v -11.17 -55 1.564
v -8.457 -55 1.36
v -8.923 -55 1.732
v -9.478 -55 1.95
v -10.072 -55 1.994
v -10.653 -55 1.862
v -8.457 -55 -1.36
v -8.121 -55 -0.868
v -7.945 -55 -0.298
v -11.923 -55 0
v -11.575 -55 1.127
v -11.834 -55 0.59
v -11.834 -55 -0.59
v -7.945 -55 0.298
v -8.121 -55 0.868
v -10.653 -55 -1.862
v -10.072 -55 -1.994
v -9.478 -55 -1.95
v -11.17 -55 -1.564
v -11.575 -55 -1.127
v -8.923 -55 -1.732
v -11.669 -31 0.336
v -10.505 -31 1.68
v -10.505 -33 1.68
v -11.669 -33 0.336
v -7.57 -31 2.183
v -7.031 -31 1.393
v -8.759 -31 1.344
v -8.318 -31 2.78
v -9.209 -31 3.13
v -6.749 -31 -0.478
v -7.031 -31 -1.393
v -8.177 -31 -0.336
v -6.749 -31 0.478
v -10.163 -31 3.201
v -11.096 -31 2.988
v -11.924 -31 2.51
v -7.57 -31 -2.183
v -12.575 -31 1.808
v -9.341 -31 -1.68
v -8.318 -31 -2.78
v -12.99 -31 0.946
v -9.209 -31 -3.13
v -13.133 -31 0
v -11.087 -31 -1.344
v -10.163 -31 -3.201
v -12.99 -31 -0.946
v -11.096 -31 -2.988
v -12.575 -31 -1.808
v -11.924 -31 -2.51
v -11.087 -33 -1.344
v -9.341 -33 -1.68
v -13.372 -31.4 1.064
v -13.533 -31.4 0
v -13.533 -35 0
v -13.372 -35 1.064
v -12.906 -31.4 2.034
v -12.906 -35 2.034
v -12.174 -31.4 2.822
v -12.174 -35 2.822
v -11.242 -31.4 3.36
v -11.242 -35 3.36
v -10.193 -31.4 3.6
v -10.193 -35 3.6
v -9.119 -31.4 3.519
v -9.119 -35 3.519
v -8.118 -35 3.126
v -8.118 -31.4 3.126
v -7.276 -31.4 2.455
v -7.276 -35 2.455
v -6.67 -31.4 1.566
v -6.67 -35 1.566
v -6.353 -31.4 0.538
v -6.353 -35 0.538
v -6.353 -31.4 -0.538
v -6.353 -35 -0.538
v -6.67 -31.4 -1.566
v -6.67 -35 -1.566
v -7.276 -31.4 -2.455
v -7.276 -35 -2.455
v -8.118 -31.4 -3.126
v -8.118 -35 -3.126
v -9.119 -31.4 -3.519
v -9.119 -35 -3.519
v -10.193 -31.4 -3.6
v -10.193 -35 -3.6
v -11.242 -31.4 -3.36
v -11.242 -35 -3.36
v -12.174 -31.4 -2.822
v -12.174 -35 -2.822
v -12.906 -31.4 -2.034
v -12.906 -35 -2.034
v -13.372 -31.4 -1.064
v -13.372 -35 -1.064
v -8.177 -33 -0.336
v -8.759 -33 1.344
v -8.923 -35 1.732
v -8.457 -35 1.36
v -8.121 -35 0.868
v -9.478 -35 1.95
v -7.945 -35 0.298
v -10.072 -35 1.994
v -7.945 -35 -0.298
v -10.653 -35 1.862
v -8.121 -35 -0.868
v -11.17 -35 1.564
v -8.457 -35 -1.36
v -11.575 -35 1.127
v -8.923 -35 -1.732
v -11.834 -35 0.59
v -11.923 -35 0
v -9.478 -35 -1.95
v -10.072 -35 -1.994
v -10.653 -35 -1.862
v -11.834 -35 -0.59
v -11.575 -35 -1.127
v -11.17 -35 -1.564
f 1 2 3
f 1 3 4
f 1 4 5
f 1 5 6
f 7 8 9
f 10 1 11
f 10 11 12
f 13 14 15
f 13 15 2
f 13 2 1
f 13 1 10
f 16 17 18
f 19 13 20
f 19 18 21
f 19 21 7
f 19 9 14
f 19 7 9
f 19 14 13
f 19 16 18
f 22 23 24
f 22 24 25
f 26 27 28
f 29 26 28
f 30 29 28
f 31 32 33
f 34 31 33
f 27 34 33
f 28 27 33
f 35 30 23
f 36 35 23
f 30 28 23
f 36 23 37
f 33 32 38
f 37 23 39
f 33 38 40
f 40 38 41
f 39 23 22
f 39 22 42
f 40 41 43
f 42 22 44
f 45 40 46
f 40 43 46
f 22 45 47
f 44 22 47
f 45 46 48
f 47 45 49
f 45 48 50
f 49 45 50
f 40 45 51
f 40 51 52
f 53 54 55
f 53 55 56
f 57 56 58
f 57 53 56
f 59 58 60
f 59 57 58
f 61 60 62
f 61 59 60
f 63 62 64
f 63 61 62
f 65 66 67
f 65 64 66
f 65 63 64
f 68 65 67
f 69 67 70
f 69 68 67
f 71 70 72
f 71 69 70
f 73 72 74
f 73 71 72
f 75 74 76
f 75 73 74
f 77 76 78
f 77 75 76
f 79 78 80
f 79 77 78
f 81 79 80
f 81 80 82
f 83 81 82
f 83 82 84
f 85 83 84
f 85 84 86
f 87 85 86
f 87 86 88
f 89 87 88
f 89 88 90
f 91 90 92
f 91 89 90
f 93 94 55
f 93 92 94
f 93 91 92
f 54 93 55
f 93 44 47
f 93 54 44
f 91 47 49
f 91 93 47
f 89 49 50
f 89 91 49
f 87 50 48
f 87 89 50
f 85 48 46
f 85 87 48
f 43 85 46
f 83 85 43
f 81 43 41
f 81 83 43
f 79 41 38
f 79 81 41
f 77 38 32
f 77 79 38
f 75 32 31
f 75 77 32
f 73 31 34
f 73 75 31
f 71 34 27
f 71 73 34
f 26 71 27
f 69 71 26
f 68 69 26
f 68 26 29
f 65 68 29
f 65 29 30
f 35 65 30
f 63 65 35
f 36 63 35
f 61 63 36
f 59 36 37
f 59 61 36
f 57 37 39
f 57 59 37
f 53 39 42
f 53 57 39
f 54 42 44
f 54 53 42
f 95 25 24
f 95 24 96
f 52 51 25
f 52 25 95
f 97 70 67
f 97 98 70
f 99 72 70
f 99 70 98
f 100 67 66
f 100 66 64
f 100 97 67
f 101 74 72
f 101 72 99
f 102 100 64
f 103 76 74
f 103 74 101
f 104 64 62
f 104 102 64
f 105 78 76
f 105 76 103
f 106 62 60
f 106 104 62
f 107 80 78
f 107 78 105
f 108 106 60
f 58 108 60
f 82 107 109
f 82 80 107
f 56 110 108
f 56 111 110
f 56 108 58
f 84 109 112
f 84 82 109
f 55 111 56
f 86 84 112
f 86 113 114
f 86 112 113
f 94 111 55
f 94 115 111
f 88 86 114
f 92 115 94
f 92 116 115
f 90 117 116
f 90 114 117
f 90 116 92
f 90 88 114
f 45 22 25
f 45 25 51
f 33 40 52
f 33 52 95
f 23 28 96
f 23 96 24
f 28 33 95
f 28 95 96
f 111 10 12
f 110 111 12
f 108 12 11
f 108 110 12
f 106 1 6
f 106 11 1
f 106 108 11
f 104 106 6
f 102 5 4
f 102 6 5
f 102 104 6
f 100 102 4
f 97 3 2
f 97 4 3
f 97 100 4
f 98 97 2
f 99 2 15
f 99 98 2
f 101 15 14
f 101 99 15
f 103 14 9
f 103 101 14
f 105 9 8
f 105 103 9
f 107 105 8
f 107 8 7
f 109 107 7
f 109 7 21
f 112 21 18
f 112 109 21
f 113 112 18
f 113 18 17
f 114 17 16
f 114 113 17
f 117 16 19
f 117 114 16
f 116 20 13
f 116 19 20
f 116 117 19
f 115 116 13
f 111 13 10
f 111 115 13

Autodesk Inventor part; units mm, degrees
ref_plane "YZ Plane" through (0, 0, 0) normal (1, 0, 0) x (0, 1, 0)
ref_plane "XZ Plane" through (0, 0, 0) normal (0, 1, 0) x (-1, 0, 0)
ref_plane "XY Plane" through (0, 0, 0) normal (0, 0, 1) x (1, 0, 0)
sketch "Sketch1" plane through (0, 0, 0) normal (0, 0, 1) x (1, 0, 0)
  line L0 (-9.9228, -35) -> (-13.5328, -35)
  line L1 (-13.5328, -35) -> (-13.5328, -31)
  line L2 (-13.5328, -31) -> (-9.9228, -31)
  line L3 (-9.9228, -31) -> (-9.9228, -35)
  line L4 (-9.9228, -35) -> (-9.9228, -55)
  line L5 (-9.9228, -55) -> (-11.9228, -55)
  line L6 (-11.9228, -55) -> (-11.9228, -35)
  point P0 (0, 0)
  dimension "d0" = 3.61
  dimension "d1" = 4
  dimension "d3" = 2
  dimension "d16" = 20
revolve "Revolution1" add sketch "Sketch1" angle 360 about axis through (-9.9228, -35, 0) along (0, -1, 0)
chamfer "Chamfer1" distance 0.4 angle 45 1 edges at (-6.3128, -31, 0)
sketch "Boceto2" plane through (-9.9228, -31, 0) normal (0, 1, 0) x (1, 0, 0)
  line L0 (1.1641, -1.3443) -> (-0.5821, -1.6803)
  line L1 (-0.5821, -1.6803) -> (-1.7462, -0.336)
  line L2 (-1.7462, -0.336) -> (-1.1641, 1.3443)
  line L3 (-1.1641, 1.3443) -> (0.5821, 1.6803)
  line L4 (0.5821, 1.6803) -> (1.7462, 0.336)
  line L5 (1.7462, 0.336) -> (1.1641, -1.3443)
  point P0 (9.9228, 0)
  point P1 (0, 0)
  dimension "d11" = 3.08
extrude "Extrusión1" cut sketch "Boceto2" against normal blind 2
thread "Rosca1" size "M4x0.7" class "6g" standard "ISO Metric profile" length 430
properties part number "Tornillo Allen cabeza cilindrica M4x20mm"
